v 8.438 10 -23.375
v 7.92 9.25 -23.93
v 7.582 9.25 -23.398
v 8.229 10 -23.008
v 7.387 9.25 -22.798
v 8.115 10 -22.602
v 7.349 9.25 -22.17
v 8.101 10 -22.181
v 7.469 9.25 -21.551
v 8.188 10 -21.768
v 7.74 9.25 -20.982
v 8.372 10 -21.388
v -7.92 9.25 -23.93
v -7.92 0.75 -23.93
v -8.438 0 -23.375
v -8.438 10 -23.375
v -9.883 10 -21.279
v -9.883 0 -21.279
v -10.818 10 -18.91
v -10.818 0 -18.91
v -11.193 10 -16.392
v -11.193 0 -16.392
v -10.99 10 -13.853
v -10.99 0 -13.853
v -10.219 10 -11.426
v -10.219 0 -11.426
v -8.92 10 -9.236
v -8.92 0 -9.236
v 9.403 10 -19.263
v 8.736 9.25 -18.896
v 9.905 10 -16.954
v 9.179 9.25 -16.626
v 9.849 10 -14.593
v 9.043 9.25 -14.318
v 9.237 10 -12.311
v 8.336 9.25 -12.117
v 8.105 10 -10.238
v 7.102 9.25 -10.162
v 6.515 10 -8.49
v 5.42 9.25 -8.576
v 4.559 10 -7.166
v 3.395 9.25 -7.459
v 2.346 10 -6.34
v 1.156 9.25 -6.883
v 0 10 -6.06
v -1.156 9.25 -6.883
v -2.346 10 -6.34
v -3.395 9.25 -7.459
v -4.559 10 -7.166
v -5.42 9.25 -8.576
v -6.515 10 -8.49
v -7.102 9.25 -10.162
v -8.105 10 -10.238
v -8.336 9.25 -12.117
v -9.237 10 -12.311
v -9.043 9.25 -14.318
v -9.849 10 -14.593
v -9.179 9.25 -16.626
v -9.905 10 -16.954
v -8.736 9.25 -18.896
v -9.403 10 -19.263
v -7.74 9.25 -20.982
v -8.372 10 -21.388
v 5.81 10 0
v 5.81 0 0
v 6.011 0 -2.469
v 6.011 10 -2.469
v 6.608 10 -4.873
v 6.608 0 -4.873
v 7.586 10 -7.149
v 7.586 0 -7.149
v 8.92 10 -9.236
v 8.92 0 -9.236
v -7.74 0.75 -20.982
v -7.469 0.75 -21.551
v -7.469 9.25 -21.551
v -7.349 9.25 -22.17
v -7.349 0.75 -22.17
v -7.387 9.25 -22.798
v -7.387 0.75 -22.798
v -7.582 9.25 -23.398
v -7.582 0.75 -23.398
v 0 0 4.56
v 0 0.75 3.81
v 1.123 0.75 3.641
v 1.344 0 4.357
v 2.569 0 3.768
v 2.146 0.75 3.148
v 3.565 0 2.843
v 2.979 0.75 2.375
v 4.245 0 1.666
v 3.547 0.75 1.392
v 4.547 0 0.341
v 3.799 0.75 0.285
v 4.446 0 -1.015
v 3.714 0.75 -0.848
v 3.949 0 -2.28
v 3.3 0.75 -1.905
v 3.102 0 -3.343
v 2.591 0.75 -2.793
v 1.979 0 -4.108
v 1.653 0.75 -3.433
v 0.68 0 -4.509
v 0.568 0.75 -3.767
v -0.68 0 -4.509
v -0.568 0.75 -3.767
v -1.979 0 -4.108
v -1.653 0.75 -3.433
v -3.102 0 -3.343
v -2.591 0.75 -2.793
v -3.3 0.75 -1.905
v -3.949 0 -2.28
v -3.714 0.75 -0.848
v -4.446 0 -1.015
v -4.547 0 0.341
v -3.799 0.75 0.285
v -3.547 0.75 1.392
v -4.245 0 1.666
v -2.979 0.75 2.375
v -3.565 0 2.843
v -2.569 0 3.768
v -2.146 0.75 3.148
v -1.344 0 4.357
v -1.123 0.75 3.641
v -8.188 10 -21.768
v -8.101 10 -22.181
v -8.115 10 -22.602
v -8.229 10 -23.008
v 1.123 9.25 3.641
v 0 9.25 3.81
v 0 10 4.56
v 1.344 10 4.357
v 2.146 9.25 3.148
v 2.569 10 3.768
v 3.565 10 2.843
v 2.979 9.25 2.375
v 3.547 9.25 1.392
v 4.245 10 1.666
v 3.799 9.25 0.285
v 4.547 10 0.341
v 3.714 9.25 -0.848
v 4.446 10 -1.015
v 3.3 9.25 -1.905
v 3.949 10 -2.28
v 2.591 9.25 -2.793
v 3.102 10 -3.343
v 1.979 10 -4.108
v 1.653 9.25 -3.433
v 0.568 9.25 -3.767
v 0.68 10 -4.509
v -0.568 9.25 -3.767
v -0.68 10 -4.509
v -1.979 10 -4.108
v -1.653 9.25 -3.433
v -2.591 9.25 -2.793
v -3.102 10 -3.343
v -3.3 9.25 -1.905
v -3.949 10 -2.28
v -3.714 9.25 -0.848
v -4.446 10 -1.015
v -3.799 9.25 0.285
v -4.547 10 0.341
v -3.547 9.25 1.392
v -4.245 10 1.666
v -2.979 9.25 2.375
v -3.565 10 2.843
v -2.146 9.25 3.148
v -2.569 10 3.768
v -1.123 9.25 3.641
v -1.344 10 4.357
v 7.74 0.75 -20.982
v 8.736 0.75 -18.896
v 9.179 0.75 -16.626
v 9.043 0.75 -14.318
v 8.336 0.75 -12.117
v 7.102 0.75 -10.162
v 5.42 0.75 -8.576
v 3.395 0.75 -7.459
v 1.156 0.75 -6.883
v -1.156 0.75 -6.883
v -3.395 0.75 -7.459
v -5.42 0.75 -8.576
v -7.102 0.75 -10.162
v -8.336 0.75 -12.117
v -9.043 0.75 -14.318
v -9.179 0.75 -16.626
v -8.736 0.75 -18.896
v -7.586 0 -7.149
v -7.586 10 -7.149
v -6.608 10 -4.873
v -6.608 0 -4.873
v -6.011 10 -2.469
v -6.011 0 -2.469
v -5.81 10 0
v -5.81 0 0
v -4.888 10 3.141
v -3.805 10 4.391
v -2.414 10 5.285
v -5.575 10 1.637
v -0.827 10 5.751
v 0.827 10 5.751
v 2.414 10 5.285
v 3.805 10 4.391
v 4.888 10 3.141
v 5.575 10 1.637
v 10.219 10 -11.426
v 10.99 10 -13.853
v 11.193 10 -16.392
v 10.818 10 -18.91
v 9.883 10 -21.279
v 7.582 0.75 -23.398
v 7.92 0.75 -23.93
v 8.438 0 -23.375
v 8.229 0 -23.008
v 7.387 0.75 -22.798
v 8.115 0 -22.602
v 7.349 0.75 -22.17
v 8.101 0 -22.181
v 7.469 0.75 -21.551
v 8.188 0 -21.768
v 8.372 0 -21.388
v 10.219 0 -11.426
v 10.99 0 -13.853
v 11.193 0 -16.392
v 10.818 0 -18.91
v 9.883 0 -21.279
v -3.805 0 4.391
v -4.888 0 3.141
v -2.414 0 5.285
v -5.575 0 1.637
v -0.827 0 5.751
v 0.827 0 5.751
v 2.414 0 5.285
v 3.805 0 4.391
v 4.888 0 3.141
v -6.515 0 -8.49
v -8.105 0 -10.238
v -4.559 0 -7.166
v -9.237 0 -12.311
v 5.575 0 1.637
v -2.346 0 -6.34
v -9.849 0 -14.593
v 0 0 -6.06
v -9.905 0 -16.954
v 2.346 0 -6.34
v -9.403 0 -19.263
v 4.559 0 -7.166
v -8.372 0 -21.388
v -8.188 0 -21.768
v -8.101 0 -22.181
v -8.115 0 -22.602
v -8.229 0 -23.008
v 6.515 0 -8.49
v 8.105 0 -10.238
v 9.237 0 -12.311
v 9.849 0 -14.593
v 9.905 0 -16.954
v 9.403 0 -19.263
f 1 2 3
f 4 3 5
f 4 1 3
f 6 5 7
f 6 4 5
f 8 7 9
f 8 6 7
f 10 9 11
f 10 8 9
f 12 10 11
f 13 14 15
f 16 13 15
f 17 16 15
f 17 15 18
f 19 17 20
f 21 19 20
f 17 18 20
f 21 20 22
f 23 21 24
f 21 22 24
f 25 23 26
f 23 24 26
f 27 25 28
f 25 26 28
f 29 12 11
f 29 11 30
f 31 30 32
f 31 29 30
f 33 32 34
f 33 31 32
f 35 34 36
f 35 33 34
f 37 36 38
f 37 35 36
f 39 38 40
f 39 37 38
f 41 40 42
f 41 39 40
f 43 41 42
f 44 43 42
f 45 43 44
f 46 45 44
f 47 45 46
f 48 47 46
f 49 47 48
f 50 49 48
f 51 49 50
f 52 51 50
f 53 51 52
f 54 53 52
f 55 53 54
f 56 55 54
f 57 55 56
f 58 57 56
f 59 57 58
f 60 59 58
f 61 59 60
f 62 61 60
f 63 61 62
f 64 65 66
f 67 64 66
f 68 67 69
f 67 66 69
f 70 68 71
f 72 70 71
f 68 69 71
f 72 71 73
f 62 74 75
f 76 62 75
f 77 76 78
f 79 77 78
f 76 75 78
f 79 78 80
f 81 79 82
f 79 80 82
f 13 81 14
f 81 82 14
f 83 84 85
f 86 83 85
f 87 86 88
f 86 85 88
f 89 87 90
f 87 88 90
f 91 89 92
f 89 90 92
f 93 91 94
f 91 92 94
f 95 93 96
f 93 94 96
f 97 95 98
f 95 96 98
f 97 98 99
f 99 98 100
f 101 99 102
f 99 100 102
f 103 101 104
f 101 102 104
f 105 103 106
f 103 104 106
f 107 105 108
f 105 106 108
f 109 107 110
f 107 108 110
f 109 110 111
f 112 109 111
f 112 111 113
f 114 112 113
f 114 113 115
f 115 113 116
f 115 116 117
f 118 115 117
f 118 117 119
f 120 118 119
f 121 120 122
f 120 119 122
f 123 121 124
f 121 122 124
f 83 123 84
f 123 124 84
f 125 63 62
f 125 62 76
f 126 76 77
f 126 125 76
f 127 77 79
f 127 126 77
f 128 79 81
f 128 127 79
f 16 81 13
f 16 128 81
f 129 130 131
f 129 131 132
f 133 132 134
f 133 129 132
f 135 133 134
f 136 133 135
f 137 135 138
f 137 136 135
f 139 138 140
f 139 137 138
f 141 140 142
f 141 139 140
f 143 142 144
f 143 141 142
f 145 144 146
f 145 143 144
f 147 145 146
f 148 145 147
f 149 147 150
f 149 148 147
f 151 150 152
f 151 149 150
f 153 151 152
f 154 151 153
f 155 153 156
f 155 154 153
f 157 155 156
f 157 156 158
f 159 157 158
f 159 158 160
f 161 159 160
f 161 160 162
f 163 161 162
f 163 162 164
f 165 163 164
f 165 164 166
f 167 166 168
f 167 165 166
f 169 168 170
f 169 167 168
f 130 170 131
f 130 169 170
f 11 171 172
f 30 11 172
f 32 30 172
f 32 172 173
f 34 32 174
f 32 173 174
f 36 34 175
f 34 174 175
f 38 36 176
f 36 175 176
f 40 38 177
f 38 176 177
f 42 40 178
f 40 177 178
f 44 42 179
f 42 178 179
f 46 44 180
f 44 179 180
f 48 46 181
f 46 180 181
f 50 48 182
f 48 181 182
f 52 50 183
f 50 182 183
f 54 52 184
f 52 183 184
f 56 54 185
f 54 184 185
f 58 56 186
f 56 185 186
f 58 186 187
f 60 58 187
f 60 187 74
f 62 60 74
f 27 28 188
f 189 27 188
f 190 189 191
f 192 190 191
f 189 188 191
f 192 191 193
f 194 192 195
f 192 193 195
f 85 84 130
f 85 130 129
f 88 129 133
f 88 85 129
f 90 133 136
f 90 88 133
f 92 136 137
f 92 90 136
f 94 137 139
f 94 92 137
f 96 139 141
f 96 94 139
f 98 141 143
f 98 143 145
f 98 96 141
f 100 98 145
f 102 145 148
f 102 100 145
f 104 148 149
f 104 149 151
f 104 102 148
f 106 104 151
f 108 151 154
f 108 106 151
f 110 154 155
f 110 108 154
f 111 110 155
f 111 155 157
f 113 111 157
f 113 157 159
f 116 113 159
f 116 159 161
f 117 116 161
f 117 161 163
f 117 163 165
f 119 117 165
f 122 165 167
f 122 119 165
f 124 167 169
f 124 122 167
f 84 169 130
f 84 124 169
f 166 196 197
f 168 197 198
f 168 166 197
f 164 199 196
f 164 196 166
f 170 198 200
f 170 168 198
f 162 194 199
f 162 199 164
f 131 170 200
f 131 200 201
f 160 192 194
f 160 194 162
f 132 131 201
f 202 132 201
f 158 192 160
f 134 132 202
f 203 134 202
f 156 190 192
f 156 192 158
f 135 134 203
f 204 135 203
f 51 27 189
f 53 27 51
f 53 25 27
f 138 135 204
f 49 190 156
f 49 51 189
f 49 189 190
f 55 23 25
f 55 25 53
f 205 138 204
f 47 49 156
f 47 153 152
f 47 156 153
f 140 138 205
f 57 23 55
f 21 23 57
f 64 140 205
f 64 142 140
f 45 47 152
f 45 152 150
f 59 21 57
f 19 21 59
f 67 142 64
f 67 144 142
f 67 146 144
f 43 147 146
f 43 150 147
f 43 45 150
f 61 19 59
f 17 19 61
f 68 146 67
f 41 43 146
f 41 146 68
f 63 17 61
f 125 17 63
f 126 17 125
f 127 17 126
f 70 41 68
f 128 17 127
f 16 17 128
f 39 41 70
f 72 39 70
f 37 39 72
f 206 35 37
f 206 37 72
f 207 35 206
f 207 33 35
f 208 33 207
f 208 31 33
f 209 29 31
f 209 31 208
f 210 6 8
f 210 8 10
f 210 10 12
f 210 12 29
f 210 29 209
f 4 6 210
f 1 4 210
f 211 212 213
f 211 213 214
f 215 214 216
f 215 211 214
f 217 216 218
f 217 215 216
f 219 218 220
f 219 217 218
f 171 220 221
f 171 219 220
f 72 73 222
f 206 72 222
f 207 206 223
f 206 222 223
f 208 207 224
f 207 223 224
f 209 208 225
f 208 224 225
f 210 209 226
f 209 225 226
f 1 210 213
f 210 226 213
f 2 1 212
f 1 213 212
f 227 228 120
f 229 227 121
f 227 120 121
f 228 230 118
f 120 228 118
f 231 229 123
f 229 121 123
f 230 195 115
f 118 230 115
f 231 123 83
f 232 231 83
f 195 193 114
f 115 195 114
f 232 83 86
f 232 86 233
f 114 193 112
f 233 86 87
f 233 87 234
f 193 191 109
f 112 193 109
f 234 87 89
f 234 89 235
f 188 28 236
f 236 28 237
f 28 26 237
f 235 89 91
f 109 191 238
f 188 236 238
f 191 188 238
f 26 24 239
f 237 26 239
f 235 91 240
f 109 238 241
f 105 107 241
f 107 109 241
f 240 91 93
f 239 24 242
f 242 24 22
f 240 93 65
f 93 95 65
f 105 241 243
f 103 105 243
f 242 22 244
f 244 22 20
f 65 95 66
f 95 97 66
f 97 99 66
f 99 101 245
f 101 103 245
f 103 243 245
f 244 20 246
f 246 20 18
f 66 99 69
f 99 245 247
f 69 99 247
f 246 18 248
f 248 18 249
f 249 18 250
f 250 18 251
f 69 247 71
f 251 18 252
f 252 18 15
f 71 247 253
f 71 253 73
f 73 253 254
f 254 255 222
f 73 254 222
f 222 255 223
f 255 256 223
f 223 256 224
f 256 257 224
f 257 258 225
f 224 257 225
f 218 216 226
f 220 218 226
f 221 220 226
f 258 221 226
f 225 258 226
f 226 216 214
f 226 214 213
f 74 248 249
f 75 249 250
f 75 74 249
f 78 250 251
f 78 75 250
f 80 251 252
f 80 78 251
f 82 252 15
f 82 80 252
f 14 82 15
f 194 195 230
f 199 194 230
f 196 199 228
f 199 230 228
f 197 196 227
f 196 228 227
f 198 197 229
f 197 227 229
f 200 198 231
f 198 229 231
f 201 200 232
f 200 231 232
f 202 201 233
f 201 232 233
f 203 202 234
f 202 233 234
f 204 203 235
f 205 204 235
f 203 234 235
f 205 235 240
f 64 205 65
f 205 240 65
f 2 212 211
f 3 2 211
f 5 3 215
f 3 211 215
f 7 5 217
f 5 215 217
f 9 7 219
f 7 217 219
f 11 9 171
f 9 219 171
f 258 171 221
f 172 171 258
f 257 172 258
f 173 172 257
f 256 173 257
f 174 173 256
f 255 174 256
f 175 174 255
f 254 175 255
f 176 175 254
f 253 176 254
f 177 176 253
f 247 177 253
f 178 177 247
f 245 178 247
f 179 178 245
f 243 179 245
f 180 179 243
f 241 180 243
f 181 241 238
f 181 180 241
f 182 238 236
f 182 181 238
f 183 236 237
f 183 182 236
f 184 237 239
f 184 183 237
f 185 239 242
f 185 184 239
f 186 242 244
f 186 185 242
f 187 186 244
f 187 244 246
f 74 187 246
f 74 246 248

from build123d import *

# Parameters (mm, degrees)
SKETCH1_R           = 3.81
BOSS_EXTRUDE1_DEPTH = 10
CHAMFER1_SIZE       = 0.75
FILLET1_R           = 2.5
CHAMFER2_SIZE       = 0.75


with BuildPart() as part:
    # Sketch1 → Boss-Extrude1 (new body)
    # profile 1 of 2: a face of its own
    with BuildSketch(Plane(origin=(0, 0, 0), x_dir=(1, 0, 0), z_dir=(0, 1, 0))):
        with BuildLine():
            Line((-6.505382387, 22.515382387), (-7.919595949, 23.929595949))
            ThreePointArc((-7.919595949, 23.929595949), (0, 4.81), (7.919595949, 23.929595949))
            Line((7.919595949, 23.929595949), (6.505382387, 22.515382387))
            ThreePointArc((6.505382387, 22.515382387), (0, 6.81), (-6.505382387, 22.515382387))
        make_face()
    # profile 2 of 2: a face of its own
    with BuildSketch(Plane(origin=(0, 0, 0), x_dir=(1, 0, 0), z_dir=(0, 1, 0))):
        with BuildLine():
            ThreePointArc((8.919585019, 9.236448267), (0, 4.81), (-8.919585019, 9.236448267))
            ThreePointArc((-8.919585019, 9.236448267), (-6.608257967, 4.872922521), (-5.81, 0))
            ThreePointArc((-5.81, 0), (0, -5.81), (5.81, 0))
            ThreePointArc((5.81, 0), (6.608257967, 4.872922521), (8.919585019, 9.236448267))
        make_face()
        with Locations(Location((0, 0, 0), (0, 0, 270))):
            Circle(SKETCH1_R, mode=Mode.SUBTRACT)
    extrude(amount=BOSS_EXTRUDE1_DEPTH)

    # Chamfer1
    chamfer1_edges = [part.edges().sort_by_distance(p)[0] for p in [
        (0, 0, -3.81),
        (0, 10, -3.81),
    ]]
    chamfer(chamfer1_edges, length=CHAMFER1_SIZE)

    # Fillet1
    # the kernel refuses this fillet: 2.5 mm, written as the material it takes off along each edge
    with BuildSketch(Plane(origin=(6.505382387, -5, -22.515382387), x_dir=(0.7071067811865479, 0, -0.707106781186547), z_dir=(0, 1, 0))) as fillet1_piece_1:
        with BuildLine():
            CenterArc((2.232142857, -2.489198605), FILLET1_R, 95.327997904, 72.388325655)
            Line((-0.210622711, -1.957318561), (-0.259478022, -1.94668096))
            ThreePointArc((-0.259478022, -1.94668096), (-0.102520236, -0.978959627), (-0.05, 0))
            Line((-0.05, 0), (0, 0.05))
            ThreePointArc((0, 0.05), (1, 0.05), (1.995357143, 0.049783972))
            Line((1.995357143, 0.049783972), (2, 0))
        make_face()
    extrude(amount=20, mode=Mode.SUBTRACT)
    with BuildSketch(Plane(origin=(-6.505382387, -5, -22.515382387), x_dir=(-0.7071067811865465, 0, -0.7071067811865487), z_dir=(0, 1, 0))) as fillet1_piece_2:
        with BuildLine():
            CenterArc((2.232142857, 2.489198605), FILLET1_R, 192.283676441, 72.388325655)
            Line((-0.210622711, 1.957318561), (-0.259478022, 1.94668096))
            ThreePointArc((-0.259478022, 1.94668096), (-0.102520236, 0.978959627), (-0.05, 0))
            Line((-0.05, 0), (0, -0.05))
            ThreePointArc((0, -0.05), (1, -0.05), (1.995357143, -0.049783972))
            Line((1.995357143, -0.049783972), (2, 0))
        make_face()
    extrude(amount=20, mode=Mode.SUBTRACT)

    # Chamfer2
    chamfer2_edges = [part.edges().sort_by_distance(p)[0] for p in [
        (0, 0, -6.81),
        (0, 10, -6.81),
        (-7.348479111, 0, -22.485272721),
        (7.348479111, 0, -22.485272721),
        (-7.348479111, 10, -22.485272721),
        (7.348479111, 10, -22.485272721),
    ]]
    chamfer(chamfer2_edges, length=CHAMFER2_SIZE)


solid = part.part
